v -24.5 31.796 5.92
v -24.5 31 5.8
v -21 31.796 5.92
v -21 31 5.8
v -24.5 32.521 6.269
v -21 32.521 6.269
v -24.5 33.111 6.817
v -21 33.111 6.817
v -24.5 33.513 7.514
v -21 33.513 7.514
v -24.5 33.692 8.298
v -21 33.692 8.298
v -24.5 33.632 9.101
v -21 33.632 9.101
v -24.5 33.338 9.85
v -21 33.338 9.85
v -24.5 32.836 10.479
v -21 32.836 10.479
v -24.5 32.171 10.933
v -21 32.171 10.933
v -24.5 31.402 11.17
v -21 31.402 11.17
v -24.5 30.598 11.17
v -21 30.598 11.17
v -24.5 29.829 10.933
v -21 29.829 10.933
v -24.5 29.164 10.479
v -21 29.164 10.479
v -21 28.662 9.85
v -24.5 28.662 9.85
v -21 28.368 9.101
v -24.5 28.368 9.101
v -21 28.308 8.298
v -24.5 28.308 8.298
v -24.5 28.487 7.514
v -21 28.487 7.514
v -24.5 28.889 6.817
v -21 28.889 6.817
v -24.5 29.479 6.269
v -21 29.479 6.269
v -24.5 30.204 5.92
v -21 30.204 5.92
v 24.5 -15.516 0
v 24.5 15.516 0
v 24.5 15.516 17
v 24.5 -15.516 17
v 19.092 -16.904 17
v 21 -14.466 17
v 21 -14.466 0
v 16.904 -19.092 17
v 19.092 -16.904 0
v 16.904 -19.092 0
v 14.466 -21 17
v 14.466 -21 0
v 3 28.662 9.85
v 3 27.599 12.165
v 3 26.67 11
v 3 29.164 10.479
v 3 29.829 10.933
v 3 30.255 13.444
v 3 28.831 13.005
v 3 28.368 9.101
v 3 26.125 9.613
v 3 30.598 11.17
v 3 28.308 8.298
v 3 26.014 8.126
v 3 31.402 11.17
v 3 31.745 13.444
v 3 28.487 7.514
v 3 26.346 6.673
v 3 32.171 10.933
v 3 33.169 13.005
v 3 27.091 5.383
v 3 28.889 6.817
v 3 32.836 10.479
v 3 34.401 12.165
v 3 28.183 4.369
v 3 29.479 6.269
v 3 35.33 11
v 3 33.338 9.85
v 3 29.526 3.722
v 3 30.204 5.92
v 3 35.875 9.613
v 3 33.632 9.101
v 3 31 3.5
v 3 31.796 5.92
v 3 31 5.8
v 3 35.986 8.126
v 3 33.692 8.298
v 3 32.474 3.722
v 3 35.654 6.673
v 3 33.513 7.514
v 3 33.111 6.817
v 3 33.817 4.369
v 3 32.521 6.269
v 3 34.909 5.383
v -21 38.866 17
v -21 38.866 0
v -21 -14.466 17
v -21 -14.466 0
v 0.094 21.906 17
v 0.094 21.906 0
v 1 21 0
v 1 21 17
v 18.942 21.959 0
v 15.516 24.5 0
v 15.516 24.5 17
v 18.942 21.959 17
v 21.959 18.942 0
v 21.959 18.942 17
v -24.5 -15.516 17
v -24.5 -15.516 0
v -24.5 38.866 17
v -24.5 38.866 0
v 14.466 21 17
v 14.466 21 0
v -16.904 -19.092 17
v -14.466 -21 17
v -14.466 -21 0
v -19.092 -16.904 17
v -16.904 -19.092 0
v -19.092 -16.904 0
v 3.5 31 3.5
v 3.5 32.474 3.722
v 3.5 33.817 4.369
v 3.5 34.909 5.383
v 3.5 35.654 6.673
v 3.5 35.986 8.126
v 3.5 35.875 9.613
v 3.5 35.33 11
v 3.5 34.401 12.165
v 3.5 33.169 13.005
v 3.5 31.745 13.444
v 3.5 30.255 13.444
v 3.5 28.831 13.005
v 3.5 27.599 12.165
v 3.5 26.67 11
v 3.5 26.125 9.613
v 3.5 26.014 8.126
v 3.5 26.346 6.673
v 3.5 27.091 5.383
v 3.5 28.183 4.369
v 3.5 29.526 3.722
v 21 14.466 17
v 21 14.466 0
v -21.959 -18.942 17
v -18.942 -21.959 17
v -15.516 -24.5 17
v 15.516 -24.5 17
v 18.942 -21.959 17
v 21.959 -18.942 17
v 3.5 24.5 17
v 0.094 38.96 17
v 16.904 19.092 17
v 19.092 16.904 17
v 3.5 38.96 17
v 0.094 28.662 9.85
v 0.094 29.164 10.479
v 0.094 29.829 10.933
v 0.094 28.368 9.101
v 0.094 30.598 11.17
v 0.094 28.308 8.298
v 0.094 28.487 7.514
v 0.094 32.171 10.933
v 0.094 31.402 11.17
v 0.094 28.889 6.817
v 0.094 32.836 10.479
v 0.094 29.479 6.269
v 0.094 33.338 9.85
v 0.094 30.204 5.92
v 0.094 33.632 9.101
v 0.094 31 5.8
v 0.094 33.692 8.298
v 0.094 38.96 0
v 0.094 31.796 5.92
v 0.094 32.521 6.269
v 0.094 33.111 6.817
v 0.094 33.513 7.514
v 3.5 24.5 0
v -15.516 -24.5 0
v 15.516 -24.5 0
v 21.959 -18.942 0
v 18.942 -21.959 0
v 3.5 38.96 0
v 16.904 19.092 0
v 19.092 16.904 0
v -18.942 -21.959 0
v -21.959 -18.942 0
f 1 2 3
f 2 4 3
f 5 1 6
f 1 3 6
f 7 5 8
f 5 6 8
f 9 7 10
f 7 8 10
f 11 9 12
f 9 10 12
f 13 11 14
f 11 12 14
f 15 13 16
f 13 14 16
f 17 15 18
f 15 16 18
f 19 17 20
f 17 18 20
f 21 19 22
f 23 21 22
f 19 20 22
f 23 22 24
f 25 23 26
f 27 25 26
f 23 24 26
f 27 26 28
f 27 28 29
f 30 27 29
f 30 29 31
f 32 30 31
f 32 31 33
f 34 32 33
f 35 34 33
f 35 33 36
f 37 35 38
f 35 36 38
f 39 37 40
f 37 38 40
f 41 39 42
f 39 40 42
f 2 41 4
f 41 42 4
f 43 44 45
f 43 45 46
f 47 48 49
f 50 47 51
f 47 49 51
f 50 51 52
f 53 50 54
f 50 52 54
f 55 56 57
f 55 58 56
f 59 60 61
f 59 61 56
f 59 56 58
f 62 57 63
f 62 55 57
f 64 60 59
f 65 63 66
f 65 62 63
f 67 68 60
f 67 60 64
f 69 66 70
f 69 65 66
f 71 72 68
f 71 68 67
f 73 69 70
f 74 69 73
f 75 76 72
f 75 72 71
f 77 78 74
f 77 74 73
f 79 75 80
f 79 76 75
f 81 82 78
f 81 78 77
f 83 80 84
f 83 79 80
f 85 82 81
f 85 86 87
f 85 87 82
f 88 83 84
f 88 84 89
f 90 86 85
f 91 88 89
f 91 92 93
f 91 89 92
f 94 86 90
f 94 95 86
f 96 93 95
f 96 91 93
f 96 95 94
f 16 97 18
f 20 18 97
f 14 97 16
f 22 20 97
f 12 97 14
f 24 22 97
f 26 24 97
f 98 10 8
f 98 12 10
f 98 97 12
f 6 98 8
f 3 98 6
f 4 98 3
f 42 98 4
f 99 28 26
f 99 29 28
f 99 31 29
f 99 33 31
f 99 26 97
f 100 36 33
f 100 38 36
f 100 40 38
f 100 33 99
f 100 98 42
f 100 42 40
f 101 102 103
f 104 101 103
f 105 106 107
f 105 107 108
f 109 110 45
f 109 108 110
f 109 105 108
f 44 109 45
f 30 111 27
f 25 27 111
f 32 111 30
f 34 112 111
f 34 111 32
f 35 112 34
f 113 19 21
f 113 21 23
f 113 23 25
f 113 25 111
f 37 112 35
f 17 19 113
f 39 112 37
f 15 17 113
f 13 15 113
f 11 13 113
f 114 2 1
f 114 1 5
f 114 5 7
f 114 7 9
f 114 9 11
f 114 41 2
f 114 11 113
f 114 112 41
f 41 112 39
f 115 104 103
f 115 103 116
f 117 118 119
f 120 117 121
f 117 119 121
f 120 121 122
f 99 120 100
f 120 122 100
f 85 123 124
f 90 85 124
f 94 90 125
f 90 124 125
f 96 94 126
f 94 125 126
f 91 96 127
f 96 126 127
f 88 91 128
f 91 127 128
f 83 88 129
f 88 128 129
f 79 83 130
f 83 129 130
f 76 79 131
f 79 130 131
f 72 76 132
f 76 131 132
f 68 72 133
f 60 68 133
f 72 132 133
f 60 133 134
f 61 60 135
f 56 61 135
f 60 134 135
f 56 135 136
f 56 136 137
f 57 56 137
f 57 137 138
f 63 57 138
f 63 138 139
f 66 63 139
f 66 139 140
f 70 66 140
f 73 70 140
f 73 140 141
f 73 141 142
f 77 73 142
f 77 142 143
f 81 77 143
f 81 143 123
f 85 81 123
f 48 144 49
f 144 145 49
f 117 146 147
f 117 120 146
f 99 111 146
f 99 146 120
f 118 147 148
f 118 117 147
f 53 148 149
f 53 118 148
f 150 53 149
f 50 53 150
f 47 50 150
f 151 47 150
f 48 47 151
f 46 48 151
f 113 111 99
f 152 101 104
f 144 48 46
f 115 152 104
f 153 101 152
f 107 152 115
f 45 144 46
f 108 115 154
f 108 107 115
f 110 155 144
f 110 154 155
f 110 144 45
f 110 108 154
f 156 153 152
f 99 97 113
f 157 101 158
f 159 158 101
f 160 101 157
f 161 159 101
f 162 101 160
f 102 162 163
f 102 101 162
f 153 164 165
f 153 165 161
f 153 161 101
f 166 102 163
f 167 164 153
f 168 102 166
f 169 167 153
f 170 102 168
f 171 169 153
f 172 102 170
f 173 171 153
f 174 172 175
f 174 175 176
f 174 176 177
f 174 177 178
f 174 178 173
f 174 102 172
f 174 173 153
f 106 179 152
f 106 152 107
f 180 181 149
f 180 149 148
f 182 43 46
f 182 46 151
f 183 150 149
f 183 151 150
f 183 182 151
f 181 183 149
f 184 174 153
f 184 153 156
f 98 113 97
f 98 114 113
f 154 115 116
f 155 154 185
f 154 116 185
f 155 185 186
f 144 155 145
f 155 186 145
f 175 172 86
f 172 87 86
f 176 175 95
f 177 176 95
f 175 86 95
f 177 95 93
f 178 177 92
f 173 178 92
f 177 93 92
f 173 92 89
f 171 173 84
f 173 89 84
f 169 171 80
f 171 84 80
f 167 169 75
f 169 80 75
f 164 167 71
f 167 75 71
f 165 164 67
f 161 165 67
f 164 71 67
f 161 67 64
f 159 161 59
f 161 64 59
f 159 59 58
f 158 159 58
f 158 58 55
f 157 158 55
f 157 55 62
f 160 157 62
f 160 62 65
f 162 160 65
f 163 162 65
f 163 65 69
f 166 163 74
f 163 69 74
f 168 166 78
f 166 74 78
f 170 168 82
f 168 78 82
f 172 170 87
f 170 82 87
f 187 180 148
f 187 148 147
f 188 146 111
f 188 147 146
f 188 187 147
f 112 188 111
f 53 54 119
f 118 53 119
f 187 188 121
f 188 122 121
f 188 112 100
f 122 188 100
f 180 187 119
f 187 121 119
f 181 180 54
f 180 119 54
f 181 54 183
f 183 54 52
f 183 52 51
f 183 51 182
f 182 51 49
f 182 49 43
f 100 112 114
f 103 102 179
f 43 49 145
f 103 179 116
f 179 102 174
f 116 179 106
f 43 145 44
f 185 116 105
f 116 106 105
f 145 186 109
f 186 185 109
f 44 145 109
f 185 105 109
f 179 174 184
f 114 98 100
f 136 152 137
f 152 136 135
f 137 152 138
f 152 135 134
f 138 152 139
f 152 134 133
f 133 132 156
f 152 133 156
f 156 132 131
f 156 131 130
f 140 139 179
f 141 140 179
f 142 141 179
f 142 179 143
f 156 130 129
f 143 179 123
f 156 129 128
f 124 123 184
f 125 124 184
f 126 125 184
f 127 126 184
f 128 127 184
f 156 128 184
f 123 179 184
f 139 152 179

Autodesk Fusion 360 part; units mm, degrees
sketch "Sketch2" plane through (0, 0, 0) normal (0, 0, 1) x (1, 0, 0)
  line L0 (14.4655, -21) -> (-14.4655, -21)
  line L1 (-21, -14.4655) -> (-21, 14.4655)
  line L2 (1, 21) -> (14.4655, 21)
  line L3 (21, 14.4655) -> (21, -14.4655)
  line L4 (18.0312, -18.0312) -> (-18.0312, 18.0312) construction
  line L5 (-18.0312, -18.0312) -> (18.0312, 18.0312) construction
  arc A0 (21, 14.4655) -> (14.4655, 21) centre (0, 0) ccw
  arc A1 (-21, -14.4655) -> (-14.4655, -21) centre (0, 0) ccw
  arc A2 (14.4655, -21) -> (21, -14.4655) centre (0, 0) ccw
  line L6 (-21, 14.4655) -> (-21, 21)
  line L7 (0.0943, 21.9057) -> (0.0943, 41)
  line L8 (0.0943, 41) -> (-21, 41)
  line L9 (-21, 41) -> (-21, 21)
  line L10 (0.0943, 21.9057) -> (1, 21)
  line L11 (-24.5, 38.866) -> (-24.5, 21)
  line L12 (-24.5, 14.4655) -> (-24.5, 21)
  line L13 (-24.5, -15.5161) -> (-24.5, 14.4655)
  arc A3 (-24.5, -15.5161) -> (-15.5161, -24.5) centre (0, 0) ccw
  line L14 (15.5161, -24.5) -> (-15.5161, -24.5)
  arc A4 (15.5161, -24.5) -> (24.5, -15.5161) centre (0, 0) ccw
  line L15 (24.5, 15.5161) -> (24.5, -15.5161)
  arc A5 (24.5, 15.5161) -> (15.5161, 24.5) centre (0, 0) ccw
  line L16 (3.5, 24.5) -> (15.5161, 24.5)
  line L17 (3.5, 24.5) -> (3.5, 38.9603)
  line L18 (-24.5, 38.866) -> (-21, 38.866)
  line L19 (0.0943, 38.9603) -> (3.5, 38.9603)
  dimension "d3" = 51
  dimension "d6" = 20
extrude "Extrude9" add sketch "Sketch2" along normal blind 17 contours L0 L1 L2 L3 A0 A1 A2 L6 L7 L9 L10 L11 L12 L13 A3 L14 A4 L15 A5 L16 L17 L18 L19
sketch "Sketch7" plane through (-24.5, 0, 0) normal (-1, 0, 0) x (0, 0, 1)
  line L0 (0, 38.866) -> (0, -15.5161)
  line L1 (0, -15.5161) -> (17, -15.5161)
  line L2 (17, -15.5161) -> (17, 38.866)
  line L3 (17, 38.866) -> (0, 38.866)
sketch "Sketch8" plane through (3.5, 0, 0) normal (1, 0, 0) x (0, 0, -1)
  line L0 (0, 24.5) -> (0, 38.9603)
  line L1 (0, 38.9603) -> (-17, 38.9603)
  line L2 (-17, 38.9603) -> (-17, 24.5)
  line L3 (-17, 24.5) -> (0, 24.5)
  circle A0 centre (-8.5, 31) radius 2.7
  dimension "d32" = 5.4
extrude "Extrude10" cut sketch "Sketch8" against normal blind 50 contours A0
sketch "Sketch9" plane through (3.5, 0, 0) normal (1, 0, 0) x (0, 0, -1)
  circle A0 centre (-8.5, 31) radius 2.7
  line L0 (0, 24.5) -> (0, 38.9603)
  line L1 (0, 38.9603) -> (-17, 38.9603)
  line L2 (-17, 38.9603) -> (-17, 24.5)
  line L3 (-17, 24.5) -> (0, 24.5)
  circle A1 centre (-8.5, 31) radius 5
  dimension "d35" = 10
extrude "Extrude11" cut sketch "Sketch9" against normal blind 0.5 contours A1
